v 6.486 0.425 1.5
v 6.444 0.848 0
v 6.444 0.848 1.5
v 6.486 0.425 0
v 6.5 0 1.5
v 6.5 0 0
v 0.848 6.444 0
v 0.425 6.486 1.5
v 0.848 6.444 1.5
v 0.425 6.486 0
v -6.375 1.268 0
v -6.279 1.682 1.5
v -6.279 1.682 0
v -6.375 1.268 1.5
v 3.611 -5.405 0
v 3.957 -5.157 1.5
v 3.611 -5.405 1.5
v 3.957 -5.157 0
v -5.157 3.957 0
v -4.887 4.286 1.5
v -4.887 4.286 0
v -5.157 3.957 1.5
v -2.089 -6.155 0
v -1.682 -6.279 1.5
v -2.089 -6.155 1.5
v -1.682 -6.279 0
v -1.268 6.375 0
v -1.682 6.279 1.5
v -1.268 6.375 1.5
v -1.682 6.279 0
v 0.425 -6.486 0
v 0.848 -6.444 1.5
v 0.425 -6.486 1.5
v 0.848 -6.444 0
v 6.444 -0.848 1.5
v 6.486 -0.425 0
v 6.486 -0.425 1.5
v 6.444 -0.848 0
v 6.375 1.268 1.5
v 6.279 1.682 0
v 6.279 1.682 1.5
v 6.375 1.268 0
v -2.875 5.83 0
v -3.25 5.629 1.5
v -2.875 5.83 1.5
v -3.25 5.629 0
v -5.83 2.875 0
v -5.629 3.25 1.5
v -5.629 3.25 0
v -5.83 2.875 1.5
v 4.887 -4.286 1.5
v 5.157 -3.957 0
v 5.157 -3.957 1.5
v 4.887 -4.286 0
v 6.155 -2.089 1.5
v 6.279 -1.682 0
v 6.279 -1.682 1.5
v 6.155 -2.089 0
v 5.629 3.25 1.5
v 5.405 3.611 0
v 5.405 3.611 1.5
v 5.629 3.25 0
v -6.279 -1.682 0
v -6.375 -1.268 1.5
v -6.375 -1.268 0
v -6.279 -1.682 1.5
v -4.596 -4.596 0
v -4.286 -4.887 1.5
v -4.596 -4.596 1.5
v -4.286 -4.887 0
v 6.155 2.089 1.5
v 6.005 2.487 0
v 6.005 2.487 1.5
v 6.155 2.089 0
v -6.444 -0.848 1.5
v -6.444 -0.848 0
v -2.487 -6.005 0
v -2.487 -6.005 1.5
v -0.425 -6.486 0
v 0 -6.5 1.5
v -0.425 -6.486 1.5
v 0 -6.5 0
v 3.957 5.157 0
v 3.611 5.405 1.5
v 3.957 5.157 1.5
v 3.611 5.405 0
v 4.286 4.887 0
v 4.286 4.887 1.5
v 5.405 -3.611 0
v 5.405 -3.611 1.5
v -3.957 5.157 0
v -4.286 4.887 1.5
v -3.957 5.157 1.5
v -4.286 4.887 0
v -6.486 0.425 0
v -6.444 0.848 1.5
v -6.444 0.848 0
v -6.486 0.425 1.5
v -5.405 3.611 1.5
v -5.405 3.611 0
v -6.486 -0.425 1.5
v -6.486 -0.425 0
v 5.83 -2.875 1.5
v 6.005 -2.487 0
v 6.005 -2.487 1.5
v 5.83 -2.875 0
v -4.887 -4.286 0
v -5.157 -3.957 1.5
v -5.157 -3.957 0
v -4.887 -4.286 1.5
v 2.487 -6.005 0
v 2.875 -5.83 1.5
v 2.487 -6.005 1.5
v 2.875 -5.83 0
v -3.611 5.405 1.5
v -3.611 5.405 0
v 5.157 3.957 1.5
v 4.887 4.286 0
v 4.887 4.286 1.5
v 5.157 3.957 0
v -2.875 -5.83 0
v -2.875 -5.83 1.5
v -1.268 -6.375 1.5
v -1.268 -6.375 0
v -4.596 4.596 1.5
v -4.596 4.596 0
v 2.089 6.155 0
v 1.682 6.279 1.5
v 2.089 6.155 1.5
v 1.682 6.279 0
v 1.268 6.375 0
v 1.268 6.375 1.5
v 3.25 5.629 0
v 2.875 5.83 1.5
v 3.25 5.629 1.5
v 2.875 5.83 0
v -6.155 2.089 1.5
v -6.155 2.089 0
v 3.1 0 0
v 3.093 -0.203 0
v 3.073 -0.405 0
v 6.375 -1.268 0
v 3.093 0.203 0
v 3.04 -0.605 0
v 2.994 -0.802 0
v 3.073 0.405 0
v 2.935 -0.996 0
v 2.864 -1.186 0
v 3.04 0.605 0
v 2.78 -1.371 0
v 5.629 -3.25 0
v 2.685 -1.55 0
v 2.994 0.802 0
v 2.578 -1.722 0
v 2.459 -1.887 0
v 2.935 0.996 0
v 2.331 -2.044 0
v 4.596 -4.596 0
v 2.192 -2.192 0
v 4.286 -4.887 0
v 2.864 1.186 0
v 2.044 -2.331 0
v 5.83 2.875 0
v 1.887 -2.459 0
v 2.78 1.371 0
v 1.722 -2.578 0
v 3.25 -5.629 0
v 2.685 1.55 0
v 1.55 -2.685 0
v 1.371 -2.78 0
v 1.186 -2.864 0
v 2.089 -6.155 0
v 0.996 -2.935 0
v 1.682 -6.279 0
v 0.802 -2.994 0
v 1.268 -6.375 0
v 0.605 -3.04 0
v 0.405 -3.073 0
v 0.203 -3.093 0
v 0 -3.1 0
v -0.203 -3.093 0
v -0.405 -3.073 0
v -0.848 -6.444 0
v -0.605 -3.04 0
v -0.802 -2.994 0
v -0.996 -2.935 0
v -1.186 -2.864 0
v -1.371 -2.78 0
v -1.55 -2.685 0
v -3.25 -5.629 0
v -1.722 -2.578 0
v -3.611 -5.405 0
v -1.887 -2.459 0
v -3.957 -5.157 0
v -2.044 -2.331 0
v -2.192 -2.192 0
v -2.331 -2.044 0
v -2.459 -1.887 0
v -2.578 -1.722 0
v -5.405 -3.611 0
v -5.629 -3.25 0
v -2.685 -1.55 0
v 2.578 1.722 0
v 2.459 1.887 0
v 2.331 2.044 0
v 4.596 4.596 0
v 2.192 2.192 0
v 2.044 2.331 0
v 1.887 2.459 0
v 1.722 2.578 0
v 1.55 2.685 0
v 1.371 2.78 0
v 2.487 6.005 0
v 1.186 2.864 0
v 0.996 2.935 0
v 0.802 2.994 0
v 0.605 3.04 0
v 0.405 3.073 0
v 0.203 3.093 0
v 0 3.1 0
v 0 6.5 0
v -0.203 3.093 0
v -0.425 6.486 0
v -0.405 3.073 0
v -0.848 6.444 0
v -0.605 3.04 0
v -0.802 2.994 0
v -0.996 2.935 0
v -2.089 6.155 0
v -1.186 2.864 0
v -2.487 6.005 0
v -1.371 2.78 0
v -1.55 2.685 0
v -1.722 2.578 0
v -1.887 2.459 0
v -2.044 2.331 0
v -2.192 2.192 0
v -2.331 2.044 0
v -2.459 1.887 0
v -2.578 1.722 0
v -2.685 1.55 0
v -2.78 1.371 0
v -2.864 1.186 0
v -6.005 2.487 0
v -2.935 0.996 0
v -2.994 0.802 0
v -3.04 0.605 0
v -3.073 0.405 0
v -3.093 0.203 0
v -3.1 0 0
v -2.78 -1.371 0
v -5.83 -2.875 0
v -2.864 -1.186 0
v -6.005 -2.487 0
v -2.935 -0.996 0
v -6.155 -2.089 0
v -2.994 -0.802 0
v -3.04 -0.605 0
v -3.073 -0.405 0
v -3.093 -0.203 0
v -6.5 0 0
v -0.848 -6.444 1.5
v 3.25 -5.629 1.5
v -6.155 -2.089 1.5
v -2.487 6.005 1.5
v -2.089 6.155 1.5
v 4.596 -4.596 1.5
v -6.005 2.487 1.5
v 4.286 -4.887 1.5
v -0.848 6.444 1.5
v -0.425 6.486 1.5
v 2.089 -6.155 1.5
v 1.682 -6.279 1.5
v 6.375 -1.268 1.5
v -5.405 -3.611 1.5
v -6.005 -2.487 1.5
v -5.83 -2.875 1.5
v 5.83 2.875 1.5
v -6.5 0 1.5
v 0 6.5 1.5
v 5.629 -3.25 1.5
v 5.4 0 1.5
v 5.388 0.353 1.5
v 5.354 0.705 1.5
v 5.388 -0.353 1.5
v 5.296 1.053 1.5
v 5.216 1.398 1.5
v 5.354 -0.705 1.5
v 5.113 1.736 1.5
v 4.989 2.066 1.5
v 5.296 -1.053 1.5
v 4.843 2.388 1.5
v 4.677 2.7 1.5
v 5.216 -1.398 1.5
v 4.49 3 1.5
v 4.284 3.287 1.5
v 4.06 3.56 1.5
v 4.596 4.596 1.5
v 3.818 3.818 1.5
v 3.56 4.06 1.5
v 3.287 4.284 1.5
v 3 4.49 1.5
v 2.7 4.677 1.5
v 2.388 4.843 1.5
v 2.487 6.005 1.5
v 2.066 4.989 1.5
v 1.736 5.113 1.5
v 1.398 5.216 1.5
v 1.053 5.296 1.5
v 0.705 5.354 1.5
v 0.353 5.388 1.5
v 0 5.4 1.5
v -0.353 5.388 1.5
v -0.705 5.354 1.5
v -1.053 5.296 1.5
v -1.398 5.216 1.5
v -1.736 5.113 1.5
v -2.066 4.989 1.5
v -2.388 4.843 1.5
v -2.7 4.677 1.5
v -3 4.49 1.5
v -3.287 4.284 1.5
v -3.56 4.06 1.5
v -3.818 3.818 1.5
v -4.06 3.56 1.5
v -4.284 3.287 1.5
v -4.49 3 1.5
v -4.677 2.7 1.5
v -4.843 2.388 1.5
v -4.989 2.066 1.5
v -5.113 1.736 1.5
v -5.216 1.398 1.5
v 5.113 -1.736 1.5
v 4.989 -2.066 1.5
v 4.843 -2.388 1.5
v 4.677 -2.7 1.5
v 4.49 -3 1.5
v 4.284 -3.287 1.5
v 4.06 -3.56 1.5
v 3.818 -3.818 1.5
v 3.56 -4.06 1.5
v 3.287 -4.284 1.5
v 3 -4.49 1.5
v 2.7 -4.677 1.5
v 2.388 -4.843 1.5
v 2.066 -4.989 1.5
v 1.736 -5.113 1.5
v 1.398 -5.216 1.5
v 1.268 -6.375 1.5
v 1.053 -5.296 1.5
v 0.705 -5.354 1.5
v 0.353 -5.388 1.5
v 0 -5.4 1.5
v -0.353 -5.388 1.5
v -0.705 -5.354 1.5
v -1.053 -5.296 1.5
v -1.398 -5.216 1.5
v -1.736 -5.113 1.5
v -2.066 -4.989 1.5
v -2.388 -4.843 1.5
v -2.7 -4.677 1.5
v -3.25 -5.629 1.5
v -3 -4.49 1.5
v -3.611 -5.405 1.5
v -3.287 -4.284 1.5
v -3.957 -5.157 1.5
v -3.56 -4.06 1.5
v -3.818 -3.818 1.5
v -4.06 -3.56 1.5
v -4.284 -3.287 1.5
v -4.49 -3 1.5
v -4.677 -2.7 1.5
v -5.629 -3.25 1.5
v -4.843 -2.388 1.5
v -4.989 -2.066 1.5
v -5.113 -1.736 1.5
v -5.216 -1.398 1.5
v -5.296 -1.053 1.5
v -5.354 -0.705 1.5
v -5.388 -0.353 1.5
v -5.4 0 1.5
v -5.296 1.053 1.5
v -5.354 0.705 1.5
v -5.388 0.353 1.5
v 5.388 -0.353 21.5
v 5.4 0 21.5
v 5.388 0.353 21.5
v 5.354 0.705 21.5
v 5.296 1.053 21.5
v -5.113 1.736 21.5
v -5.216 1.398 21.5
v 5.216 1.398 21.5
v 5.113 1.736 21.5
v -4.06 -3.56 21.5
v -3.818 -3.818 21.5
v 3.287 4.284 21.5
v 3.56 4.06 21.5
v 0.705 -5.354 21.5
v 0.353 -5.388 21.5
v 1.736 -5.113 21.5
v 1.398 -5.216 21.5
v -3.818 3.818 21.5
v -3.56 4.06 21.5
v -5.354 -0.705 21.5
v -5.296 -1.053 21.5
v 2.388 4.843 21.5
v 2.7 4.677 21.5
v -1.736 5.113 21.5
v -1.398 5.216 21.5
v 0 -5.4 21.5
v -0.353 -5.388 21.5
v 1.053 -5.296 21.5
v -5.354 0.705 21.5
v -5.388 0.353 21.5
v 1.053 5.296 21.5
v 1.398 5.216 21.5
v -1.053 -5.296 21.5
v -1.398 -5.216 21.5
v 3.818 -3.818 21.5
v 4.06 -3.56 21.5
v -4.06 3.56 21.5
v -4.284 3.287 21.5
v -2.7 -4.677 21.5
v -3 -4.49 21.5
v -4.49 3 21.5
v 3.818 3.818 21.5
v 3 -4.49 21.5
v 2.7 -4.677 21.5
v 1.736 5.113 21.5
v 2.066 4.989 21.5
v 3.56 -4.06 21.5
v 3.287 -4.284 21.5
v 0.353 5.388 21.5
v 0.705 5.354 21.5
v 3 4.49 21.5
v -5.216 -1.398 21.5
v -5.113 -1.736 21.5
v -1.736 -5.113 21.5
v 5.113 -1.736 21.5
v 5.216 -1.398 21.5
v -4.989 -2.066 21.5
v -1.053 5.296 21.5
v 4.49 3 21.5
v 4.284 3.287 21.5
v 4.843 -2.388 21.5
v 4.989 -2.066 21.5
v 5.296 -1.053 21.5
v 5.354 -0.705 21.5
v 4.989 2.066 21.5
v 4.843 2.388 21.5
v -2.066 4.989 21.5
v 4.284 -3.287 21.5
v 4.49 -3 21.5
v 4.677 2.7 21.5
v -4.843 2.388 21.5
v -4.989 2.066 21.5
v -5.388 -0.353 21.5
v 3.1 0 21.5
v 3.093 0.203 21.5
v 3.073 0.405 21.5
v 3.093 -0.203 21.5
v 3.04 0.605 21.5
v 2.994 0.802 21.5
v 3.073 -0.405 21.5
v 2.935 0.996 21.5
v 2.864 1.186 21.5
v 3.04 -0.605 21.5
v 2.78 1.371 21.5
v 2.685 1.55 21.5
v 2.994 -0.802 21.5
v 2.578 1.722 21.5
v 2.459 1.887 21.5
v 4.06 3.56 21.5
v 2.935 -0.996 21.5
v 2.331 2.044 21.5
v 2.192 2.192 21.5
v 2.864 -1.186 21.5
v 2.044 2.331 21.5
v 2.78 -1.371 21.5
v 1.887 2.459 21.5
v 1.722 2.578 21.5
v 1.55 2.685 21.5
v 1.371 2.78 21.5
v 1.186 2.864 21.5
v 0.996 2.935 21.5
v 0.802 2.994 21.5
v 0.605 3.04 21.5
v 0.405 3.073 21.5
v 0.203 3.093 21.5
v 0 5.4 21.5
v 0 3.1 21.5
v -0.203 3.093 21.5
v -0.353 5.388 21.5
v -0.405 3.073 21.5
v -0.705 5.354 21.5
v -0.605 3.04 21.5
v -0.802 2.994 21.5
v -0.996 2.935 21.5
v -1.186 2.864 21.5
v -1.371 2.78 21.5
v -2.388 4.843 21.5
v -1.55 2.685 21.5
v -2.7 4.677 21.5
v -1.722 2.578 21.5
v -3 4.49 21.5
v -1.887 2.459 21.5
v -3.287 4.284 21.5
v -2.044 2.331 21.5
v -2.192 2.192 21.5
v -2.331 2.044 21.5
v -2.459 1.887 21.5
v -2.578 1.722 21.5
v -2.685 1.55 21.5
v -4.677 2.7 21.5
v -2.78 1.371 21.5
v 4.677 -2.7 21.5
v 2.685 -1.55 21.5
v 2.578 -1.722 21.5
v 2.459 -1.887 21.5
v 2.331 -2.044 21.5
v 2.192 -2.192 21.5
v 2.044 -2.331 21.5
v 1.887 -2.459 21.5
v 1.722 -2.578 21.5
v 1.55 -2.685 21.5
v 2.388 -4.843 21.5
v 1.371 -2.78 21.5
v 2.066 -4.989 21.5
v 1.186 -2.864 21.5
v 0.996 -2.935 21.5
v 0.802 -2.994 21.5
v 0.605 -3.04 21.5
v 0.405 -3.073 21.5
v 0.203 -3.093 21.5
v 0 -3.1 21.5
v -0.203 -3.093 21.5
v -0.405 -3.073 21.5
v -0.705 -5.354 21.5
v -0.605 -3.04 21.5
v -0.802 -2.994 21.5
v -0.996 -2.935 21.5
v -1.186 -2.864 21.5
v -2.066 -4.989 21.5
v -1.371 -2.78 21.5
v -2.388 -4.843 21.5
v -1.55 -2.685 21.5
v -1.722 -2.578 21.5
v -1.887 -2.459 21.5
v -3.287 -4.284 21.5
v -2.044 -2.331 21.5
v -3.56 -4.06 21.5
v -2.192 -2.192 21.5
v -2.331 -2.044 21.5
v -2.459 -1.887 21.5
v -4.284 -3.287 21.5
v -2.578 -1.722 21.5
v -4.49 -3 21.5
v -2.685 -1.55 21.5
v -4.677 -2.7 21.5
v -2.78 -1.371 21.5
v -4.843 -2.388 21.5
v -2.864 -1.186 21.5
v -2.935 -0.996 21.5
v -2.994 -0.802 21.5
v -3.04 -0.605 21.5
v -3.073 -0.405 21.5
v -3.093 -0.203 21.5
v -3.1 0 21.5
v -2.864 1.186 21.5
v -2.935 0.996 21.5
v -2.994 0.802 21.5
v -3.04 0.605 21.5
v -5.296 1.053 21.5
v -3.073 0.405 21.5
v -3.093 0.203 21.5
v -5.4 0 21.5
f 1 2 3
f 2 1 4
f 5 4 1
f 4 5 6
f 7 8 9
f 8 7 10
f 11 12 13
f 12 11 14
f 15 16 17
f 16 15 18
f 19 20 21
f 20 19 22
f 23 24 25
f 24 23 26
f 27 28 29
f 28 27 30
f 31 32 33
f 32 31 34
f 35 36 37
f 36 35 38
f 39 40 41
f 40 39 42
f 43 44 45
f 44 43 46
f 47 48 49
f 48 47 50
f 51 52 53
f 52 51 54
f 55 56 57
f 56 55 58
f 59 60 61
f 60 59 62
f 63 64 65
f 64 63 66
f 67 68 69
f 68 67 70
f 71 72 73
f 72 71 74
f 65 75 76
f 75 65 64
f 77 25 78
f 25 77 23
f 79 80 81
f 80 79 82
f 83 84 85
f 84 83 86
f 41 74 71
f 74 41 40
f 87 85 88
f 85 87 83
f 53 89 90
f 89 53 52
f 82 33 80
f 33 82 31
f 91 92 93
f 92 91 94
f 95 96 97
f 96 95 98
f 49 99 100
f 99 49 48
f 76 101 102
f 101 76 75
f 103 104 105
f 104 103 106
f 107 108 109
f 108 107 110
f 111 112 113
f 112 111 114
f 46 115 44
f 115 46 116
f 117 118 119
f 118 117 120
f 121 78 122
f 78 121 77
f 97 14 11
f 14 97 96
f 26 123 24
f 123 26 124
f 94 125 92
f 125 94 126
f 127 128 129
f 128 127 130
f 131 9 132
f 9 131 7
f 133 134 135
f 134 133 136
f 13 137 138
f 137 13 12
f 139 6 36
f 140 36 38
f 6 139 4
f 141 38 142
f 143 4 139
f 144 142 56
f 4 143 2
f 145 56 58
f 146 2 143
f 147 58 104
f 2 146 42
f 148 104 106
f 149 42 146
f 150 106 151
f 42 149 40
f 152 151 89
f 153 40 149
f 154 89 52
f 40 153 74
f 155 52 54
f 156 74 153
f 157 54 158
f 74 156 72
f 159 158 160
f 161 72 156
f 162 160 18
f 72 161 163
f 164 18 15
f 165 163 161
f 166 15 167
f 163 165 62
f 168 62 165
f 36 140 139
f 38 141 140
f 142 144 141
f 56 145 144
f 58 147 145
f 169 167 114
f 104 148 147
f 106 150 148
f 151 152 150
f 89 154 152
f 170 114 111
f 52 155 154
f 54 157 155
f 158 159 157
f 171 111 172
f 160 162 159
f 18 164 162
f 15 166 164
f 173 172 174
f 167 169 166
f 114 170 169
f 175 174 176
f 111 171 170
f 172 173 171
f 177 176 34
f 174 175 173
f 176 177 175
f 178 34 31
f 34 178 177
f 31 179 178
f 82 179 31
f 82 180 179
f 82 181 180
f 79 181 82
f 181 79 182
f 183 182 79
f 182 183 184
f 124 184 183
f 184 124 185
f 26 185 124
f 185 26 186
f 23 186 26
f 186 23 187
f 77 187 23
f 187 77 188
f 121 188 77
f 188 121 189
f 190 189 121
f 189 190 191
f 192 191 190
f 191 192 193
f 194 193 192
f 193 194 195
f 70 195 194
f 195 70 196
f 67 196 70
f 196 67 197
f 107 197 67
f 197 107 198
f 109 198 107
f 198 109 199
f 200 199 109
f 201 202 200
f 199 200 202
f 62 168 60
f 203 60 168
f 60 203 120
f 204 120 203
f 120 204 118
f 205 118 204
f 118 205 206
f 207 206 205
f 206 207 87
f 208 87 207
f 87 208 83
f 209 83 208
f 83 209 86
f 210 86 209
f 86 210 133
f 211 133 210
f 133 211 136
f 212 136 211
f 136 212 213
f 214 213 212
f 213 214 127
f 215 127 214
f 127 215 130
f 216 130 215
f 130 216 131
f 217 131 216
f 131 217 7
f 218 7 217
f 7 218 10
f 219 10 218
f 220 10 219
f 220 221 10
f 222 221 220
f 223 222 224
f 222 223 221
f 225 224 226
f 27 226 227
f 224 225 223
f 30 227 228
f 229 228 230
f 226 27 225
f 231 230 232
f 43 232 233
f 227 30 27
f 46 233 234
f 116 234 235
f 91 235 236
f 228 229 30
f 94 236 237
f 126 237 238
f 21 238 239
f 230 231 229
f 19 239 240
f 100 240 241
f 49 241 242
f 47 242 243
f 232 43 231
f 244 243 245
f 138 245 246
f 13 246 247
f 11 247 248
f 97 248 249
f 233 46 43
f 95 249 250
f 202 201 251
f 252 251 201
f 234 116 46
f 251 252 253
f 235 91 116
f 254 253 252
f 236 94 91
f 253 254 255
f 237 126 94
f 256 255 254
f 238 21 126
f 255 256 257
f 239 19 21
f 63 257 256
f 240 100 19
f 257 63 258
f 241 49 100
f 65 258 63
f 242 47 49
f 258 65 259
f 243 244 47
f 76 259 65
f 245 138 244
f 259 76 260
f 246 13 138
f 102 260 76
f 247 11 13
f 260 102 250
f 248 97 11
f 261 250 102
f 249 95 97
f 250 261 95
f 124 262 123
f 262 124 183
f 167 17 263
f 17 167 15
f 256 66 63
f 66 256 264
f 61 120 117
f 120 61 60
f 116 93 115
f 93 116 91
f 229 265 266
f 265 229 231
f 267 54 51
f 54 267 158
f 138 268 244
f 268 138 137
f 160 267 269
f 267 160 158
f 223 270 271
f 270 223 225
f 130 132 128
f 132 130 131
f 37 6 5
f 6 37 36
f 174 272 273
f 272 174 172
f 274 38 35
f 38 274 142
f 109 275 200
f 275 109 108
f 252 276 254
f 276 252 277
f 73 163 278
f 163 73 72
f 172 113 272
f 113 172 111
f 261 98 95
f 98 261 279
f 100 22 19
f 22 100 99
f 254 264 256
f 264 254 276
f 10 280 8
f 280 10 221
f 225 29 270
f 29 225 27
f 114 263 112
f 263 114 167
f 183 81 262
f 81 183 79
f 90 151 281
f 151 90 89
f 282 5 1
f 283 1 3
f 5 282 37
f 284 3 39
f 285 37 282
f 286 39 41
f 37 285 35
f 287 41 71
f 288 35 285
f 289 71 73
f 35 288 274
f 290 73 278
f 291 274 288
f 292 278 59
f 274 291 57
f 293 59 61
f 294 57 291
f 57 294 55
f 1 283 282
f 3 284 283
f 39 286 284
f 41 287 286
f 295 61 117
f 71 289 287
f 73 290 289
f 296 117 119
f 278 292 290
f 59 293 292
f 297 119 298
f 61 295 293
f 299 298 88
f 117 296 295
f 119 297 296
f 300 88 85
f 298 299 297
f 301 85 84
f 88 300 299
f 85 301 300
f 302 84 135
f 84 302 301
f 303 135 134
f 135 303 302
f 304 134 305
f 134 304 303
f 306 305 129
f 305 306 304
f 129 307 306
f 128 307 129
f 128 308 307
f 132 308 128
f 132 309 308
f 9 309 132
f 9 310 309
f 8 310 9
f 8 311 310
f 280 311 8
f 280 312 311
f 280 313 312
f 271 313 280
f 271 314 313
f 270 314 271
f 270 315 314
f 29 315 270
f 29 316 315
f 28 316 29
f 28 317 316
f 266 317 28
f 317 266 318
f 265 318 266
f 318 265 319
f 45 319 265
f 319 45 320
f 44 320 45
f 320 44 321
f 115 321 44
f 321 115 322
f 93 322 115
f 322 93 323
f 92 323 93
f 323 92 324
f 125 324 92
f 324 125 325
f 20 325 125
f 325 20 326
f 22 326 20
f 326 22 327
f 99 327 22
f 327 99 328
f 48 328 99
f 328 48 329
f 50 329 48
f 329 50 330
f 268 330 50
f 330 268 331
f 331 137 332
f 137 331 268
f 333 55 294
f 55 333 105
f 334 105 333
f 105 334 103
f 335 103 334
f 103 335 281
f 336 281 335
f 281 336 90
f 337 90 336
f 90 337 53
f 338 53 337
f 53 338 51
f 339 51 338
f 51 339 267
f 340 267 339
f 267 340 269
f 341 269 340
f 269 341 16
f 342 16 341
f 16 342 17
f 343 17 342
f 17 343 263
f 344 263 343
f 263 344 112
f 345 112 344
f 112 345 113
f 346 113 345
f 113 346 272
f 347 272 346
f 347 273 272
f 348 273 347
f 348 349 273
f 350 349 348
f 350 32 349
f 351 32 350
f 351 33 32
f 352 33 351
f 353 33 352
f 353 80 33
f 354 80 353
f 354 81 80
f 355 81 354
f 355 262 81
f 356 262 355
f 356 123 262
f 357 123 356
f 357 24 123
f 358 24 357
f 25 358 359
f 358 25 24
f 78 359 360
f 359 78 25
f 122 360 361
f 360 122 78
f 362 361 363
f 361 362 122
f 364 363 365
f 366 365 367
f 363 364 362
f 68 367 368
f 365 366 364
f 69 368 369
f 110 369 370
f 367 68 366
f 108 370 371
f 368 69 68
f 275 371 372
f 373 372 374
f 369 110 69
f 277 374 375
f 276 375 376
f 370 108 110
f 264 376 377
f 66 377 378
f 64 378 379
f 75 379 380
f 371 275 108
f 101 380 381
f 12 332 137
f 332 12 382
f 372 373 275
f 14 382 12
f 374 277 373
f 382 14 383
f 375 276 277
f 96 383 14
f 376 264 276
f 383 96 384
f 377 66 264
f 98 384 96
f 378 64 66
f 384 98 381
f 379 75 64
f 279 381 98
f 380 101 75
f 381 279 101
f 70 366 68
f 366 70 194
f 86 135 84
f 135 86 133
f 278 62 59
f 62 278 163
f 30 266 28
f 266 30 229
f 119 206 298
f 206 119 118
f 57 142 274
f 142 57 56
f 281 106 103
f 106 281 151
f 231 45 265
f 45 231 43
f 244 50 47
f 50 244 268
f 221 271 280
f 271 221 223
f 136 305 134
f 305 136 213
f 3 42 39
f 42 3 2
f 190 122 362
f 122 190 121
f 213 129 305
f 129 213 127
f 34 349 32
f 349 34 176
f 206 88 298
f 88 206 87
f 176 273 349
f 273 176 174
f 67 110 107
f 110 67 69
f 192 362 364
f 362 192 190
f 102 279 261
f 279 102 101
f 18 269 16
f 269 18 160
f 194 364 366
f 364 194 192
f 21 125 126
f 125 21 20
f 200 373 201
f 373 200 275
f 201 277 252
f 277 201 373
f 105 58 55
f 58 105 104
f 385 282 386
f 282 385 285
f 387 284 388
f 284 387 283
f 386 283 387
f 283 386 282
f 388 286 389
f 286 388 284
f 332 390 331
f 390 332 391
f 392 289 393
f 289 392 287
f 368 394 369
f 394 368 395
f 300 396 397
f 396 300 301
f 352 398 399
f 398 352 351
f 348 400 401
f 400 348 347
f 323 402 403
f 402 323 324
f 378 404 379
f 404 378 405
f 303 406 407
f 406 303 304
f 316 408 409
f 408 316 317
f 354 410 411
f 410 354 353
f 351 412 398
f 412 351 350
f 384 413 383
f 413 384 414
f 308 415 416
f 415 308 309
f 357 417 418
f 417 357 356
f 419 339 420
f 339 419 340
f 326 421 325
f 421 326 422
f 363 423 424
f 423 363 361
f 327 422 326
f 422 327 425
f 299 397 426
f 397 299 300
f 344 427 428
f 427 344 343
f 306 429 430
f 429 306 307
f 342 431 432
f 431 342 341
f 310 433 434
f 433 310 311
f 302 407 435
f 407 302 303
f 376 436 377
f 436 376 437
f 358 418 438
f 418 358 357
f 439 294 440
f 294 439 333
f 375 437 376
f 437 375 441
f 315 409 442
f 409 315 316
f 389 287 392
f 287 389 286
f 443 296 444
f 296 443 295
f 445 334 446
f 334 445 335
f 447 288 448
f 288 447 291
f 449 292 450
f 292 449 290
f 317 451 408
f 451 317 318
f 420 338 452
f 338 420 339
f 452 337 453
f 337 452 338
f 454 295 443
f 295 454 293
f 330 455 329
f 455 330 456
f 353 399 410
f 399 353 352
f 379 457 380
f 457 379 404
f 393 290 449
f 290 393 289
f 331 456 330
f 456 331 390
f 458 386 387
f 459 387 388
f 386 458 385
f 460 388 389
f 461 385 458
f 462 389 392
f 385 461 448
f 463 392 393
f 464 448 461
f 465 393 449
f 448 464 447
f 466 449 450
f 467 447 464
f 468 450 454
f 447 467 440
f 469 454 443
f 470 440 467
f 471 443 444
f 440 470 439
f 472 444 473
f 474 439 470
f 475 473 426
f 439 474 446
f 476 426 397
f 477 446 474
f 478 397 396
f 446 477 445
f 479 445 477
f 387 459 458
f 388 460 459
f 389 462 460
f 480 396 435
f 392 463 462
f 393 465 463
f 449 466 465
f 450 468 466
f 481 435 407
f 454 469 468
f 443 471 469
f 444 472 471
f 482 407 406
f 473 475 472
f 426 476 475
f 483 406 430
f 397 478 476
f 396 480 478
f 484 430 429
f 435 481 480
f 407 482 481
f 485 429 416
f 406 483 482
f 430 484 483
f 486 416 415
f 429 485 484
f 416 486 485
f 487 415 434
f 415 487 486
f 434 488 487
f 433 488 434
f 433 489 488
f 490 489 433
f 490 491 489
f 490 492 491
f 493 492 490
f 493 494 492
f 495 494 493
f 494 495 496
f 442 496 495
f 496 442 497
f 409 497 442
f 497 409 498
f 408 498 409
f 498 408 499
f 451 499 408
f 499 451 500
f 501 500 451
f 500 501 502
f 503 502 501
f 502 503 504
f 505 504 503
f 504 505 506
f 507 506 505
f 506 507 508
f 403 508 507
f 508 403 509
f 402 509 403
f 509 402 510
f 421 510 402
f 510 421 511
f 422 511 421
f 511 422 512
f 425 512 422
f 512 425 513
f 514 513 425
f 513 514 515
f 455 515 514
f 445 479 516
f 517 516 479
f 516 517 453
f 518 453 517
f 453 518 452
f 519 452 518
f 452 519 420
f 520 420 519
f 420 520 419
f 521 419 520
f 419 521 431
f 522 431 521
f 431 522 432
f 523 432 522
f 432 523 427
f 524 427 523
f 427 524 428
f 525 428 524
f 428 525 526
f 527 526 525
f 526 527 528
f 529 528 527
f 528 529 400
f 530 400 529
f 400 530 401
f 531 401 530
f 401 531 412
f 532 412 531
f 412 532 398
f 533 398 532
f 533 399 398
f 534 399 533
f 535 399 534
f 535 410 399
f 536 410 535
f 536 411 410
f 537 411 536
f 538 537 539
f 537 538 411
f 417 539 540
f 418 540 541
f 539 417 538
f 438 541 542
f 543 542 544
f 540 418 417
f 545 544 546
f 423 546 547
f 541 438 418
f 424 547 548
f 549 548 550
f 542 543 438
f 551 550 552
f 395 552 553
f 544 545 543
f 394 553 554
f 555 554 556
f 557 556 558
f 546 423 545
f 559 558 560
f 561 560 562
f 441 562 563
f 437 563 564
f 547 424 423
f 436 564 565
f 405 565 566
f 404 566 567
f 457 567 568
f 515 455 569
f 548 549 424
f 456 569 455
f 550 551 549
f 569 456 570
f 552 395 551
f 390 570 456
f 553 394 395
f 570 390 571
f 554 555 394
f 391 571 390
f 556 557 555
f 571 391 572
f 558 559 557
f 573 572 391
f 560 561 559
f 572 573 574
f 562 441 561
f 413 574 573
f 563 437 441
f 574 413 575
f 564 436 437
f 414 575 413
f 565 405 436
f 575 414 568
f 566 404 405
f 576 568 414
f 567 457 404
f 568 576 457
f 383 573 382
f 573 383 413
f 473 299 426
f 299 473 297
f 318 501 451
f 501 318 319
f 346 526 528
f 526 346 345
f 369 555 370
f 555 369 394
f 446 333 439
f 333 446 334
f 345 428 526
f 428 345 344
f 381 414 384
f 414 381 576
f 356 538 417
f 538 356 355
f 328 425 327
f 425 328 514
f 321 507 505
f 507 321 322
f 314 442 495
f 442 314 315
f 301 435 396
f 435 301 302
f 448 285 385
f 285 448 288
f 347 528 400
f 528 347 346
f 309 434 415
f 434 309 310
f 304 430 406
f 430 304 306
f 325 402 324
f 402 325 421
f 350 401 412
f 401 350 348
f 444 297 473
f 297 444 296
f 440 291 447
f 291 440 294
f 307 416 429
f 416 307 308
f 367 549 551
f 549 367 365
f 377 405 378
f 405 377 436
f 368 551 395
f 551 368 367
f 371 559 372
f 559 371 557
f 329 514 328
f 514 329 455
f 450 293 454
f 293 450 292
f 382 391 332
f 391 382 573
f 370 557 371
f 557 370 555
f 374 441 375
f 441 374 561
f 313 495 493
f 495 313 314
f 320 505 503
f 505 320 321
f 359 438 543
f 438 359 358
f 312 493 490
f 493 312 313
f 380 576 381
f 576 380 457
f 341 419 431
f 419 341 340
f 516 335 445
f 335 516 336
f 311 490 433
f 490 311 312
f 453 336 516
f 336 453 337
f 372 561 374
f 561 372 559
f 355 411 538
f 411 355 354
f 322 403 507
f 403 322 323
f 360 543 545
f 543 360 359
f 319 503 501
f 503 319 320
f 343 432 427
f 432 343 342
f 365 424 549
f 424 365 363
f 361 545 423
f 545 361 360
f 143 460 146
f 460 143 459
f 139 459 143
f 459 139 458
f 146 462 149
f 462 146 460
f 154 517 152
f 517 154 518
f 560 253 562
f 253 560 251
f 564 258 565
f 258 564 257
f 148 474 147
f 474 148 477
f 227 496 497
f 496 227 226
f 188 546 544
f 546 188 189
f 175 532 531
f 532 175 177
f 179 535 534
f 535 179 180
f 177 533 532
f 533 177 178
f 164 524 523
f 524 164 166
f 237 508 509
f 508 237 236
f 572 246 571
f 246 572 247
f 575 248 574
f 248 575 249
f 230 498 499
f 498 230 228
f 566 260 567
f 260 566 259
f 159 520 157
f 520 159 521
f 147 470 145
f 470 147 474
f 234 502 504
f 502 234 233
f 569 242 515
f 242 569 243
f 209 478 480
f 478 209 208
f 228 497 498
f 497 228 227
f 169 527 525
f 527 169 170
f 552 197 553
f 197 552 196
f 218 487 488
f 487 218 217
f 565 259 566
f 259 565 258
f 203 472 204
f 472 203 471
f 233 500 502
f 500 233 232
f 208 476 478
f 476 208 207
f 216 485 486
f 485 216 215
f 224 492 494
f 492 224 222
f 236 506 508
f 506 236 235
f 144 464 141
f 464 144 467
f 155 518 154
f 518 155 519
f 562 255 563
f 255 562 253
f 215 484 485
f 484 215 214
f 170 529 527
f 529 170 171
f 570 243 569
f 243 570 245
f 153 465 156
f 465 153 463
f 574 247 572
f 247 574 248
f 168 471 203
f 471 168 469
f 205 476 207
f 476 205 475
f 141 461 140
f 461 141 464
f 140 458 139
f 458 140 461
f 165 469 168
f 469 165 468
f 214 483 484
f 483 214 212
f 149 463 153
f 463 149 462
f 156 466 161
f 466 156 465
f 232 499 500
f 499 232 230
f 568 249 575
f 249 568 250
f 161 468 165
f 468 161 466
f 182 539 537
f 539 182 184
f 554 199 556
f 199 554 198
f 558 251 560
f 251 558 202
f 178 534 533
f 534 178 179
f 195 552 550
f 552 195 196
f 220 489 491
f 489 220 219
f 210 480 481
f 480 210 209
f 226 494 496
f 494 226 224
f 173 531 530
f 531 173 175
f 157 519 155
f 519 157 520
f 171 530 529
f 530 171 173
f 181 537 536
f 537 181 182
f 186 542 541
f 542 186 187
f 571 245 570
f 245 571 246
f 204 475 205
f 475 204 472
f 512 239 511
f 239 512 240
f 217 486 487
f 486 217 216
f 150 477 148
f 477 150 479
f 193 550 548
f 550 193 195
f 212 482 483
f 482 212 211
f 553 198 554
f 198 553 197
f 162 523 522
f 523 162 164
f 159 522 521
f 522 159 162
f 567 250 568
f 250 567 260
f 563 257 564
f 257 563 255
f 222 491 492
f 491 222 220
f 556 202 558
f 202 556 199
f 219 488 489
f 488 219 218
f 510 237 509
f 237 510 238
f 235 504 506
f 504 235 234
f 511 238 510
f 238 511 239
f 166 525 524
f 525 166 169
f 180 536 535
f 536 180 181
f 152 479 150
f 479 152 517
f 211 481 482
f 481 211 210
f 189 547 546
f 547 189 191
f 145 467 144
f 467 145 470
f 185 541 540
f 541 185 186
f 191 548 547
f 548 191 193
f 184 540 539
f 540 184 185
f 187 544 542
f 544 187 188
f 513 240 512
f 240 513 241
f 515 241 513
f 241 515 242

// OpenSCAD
// PCR tube adapter sleeve: fits a 0.2 mL tube into a 1.5 mL rack hole
// Print orientation: collar on the bed (z = 0), sleeve body rises to z = 21.5

// ---------------- Parameters ----------------
collar_d      = 13;    // collar outer diameter (mm)
collar_h      = 1.5;   // collar thickness (mm)
sleeve_od     = 10.8;  // sleeve body outer diameter (mm)
sleeve_h      = 20;    // sleeve body height above collar (mm)
bore_d        = 6.2;   // through-bore diameter (mm)
eps           = 0.5;   // cutter overshoot past faces (mm)
$fn           = 96;    // curve resolution

total_h = collar_h + sleeve_h;  // 21.5 mm overall height

// ---------------- Model ----------------
difference() {
    union() {
        // Collar
        cylinder(d = collar_d, h = collar_h);
        // Sleeve body (slightly overlapping the collar for a clean union)
        translate([0, 0, collar_h - 0.01])
            cylinder(d = sleeve_od, h = sleeve_h + 0.01);
    }
    // Straight through-bore
    translate([0, 0, -eps])
        cylinder(d = bore_d, h = total_h + 2 * eps);
}
